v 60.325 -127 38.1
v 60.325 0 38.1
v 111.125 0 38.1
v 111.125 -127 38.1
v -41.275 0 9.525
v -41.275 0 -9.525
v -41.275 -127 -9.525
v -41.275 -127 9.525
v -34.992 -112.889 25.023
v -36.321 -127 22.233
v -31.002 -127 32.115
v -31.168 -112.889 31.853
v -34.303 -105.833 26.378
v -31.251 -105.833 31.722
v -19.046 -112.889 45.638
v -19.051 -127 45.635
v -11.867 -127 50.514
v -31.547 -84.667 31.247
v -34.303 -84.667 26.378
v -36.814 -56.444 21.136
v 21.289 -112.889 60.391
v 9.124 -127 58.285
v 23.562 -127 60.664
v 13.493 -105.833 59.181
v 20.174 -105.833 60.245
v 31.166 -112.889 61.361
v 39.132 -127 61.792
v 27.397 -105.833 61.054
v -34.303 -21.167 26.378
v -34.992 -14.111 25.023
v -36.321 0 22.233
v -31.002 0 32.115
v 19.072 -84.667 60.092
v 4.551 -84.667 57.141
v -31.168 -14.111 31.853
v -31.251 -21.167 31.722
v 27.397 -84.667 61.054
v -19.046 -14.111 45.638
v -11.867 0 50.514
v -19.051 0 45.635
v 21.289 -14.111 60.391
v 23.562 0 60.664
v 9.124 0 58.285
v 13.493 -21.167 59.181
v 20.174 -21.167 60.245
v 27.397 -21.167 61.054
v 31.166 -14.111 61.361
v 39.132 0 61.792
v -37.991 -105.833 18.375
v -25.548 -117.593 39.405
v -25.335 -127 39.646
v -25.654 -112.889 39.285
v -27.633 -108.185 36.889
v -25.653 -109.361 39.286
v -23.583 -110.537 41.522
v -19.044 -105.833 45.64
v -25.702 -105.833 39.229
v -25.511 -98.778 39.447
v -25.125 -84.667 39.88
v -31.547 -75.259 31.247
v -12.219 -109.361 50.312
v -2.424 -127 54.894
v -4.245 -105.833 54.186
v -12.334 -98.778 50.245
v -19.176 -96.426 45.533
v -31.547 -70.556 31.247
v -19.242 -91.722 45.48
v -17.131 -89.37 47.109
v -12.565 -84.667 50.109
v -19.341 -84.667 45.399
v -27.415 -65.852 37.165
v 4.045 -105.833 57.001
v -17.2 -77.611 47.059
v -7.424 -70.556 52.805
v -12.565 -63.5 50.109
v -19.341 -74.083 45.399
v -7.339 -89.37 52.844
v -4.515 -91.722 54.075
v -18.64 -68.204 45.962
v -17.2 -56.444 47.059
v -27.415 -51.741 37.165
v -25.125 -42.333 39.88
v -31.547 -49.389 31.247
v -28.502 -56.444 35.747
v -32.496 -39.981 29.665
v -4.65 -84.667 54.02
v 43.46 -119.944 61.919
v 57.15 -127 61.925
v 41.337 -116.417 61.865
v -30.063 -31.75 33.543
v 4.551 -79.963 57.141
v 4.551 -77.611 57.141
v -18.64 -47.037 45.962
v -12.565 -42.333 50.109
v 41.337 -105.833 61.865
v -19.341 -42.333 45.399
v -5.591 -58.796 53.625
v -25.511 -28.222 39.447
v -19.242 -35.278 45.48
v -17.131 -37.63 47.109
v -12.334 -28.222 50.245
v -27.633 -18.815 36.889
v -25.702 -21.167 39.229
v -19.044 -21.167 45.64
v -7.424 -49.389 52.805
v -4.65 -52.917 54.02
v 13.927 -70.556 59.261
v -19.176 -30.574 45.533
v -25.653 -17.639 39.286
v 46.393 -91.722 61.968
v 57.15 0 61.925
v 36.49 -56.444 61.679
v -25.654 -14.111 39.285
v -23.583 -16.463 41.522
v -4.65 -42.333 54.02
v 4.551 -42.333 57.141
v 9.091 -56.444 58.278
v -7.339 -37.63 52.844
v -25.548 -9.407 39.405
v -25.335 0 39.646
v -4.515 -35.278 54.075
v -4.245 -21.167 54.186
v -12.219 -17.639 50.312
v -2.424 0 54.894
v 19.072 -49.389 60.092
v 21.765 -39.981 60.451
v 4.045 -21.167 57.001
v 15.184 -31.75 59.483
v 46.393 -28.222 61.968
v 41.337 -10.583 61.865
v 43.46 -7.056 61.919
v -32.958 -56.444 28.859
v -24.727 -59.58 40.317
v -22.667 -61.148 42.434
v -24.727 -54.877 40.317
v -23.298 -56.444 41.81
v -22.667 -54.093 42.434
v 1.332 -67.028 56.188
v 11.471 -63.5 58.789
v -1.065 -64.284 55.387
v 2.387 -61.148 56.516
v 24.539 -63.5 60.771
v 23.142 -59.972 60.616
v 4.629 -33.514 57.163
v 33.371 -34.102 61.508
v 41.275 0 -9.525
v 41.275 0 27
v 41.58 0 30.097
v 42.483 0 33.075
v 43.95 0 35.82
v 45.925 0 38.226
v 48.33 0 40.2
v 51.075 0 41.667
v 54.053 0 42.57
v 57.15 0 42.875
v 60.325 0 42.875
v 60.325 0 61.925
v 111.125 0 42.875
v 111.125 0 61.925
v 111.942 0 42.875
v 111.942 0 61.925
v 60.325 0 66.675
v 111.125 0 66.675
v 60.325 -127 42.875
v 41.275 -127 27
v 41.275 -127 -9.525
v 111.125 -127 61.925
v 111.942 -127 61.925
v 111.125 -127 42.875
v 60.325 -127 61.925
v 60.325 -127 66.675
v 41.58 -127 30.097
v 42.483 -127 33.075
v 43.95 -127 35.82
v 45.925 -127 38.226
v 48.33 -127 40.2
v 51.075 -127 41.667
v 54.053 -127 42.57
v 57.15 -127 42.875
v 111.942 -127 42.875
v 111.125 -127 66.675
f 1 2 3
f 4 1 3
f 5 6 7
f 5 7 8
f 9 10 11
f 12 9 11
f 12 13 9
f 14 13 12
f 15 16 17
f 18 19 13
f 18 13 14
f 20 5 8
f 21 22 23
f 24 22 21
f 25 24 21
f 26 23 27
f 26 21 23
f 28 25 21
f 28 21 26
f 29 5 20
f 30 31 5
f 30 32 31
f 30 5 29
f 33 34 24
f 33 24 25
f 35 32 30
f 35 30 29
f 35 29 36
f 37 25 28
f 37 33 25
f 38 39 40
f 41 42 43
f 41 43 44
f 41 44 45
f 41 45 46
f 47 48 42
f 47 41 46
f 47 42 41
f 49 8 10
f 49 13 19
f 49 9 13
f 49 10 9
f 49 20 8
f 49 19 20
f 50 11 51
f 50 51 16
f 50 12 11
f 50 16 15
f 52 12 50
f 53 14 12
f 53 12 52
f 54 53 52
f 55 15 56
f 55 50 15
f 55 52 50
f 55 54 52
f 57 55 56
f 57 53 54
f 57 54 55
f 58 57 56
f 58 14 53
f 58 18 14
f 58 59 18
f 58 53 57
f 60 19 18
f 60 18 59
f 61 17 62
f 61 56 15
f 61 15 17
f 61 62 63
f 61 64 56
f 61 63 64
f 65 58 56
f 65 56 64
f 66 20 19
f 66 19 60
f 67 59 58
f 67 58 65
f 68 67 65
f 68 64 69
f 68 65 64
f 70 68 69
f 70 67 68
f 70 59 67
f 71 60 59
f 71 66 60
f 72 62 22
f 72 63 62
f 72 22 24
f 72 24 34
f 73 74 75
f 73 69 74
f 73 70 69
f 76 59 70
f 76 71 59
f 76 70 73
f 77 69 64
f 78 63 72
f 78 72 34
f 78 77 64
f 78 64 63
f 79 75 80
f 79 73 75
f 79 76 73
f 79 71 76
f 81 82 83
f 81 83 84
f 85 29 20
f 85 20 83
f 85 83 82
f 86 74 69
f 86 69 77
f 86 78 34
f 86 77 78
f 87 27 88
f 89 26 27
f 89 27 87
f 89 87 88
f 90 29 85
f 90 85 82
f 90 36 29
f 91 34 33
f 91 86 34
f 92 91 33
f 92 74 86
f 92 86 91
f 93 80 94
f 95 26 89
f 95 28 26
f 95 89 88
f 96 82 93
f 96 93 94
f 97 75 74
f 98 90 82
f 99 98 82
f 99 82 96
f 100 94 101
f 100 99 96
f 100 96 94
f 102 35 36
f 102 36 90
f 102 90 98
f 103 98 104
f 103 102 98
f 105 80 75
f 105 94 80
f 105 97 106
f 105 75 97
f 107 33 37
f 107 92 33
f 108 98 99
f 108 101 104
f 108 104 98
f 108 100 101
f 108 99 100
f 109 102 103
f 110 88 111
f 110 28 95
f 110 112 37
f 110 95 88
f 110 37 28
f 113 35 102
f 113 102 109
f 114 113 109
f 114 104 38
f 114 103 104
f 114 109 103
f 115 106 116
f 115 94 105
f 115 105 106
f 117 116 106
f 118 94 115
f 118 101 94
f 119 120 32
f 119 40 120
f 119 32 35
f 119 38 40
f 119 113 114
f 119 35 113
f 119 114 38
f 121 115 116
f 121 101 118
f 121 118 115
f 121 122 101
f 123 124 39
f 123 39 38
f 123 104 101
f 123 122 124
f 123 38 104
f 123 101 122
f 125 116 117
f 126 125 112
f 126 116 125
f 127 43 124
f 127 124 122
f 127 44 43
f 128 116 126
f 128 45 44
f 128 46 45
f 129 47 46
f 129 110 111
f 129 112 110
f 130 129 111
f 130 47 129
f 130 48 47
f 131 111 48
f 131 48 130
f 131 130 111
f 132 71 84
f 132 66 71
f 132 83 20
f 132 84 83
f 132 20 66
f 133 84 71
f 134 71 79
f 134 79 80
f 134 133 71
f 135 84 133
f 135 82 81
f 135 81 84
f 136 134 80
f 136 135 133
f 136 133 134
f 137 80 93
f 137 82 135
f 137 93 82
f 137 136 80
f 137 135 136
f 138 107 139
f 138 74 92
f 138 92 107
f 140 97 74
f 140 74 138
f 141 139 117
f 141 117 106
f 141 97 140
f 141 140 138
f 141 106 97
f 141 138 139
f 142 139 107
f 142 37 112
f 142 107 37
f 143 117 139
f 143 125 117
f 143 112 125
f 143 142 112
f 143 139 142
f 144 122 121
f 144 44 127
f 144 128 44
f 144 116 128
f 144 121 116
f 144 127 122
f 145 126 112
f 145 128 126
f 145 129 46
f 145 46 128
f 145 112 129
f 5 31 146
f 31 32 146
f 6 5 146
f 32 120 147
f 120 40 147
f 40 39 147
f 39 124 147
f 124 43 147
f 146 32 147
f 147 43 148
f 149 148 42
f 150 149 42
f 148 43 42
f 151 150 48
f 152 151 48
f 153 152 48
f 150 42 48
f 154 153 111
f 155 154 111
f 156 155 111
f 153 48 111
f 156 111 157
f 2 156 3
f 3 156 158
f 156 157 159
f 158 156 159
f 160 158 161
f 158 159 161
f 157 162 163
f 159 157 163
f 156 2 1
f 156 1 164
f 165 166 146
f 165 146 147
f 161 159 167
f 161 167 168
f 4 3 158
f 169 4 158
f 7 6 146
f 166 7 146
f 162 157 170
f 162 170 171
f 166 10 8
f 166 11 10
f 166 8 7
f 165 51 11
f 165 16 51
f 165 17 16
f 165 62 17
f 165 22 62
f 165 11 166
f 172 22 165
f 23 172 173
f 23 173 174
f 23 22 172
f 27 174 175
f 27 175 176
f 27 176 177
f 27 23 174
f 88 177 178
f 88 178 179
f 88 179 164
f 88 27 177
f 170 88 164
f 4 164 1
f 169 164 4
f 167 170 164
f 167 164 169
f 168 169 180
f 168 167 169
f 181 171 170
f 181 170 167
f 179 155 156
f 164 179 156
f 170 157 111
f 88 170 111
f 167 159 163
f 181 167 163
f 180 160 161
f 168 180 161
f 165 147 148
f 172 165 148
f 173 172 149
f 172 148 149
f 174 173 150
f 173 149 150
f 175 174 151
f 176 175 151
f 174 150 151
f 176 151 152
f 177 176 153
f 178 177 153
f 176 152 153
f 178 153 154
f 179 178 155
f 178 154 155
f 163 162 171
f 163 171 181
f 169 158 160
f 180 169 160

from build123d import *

# Parameters (mm, degrees)
F0_W     = 50.8
F0_H     = 4.7752
F0_H_2   = 4.7498
F0_W_2   = 0.8166841354
F0_H_3   = 19.05
F0_W_3   = 82.55
F1_DEPTH = 127


with BuildPart() as f1:
    # F0 (on Front) → F1 (new body)
    with BuildSketch(Plane.XZ):
        with Locations((85.725, 40.4876)):
            Rectangle(F0_W, F0_H)
        with Locations((85.725, 64.3001)):
            Rectangle(F0_W, F0_H_2)
        with Locations((111.5333420677, 52.4002)):
            Rectangle(F0_W_2, F0_H_3)
        with BuildLine():
            add(Edge.make_bspline(
                [(-41.275, 9.525), (-28.754702283, 46.6331869148), (-10.0444221635, 63.1745123066), (57.15, 61.9252)],
                knots=[0, 0, 0, 0, 111.5045361635, 111.5045361635, 111.5045361635, 111.5045361635], degree=3))
            Line((-41.275, 9.525), (41.275, 9.525))
            Line((41.275, 9.525), (41.275, 27.0002))
            ThreePointArc((41.275, 27.0002), (45.9246798487, 38.2255201513), (57.15, 42.8752))
            Line((57.15, 42.8752), (60.325, 42.8752))
            Line((60.325, 42.8752), (60.325, 61.9252))
            Line((60.325, 61.9252), (57.15, 61.9252))
        make_face()
        with Locations((85.725, 52.4002)):
            Rectangle(F0_W, F0_H_3)
        Rectangle(F0_W_3, F0_H_3)
    extrude(amount=F1_DEPTH)


solid = f1.part
